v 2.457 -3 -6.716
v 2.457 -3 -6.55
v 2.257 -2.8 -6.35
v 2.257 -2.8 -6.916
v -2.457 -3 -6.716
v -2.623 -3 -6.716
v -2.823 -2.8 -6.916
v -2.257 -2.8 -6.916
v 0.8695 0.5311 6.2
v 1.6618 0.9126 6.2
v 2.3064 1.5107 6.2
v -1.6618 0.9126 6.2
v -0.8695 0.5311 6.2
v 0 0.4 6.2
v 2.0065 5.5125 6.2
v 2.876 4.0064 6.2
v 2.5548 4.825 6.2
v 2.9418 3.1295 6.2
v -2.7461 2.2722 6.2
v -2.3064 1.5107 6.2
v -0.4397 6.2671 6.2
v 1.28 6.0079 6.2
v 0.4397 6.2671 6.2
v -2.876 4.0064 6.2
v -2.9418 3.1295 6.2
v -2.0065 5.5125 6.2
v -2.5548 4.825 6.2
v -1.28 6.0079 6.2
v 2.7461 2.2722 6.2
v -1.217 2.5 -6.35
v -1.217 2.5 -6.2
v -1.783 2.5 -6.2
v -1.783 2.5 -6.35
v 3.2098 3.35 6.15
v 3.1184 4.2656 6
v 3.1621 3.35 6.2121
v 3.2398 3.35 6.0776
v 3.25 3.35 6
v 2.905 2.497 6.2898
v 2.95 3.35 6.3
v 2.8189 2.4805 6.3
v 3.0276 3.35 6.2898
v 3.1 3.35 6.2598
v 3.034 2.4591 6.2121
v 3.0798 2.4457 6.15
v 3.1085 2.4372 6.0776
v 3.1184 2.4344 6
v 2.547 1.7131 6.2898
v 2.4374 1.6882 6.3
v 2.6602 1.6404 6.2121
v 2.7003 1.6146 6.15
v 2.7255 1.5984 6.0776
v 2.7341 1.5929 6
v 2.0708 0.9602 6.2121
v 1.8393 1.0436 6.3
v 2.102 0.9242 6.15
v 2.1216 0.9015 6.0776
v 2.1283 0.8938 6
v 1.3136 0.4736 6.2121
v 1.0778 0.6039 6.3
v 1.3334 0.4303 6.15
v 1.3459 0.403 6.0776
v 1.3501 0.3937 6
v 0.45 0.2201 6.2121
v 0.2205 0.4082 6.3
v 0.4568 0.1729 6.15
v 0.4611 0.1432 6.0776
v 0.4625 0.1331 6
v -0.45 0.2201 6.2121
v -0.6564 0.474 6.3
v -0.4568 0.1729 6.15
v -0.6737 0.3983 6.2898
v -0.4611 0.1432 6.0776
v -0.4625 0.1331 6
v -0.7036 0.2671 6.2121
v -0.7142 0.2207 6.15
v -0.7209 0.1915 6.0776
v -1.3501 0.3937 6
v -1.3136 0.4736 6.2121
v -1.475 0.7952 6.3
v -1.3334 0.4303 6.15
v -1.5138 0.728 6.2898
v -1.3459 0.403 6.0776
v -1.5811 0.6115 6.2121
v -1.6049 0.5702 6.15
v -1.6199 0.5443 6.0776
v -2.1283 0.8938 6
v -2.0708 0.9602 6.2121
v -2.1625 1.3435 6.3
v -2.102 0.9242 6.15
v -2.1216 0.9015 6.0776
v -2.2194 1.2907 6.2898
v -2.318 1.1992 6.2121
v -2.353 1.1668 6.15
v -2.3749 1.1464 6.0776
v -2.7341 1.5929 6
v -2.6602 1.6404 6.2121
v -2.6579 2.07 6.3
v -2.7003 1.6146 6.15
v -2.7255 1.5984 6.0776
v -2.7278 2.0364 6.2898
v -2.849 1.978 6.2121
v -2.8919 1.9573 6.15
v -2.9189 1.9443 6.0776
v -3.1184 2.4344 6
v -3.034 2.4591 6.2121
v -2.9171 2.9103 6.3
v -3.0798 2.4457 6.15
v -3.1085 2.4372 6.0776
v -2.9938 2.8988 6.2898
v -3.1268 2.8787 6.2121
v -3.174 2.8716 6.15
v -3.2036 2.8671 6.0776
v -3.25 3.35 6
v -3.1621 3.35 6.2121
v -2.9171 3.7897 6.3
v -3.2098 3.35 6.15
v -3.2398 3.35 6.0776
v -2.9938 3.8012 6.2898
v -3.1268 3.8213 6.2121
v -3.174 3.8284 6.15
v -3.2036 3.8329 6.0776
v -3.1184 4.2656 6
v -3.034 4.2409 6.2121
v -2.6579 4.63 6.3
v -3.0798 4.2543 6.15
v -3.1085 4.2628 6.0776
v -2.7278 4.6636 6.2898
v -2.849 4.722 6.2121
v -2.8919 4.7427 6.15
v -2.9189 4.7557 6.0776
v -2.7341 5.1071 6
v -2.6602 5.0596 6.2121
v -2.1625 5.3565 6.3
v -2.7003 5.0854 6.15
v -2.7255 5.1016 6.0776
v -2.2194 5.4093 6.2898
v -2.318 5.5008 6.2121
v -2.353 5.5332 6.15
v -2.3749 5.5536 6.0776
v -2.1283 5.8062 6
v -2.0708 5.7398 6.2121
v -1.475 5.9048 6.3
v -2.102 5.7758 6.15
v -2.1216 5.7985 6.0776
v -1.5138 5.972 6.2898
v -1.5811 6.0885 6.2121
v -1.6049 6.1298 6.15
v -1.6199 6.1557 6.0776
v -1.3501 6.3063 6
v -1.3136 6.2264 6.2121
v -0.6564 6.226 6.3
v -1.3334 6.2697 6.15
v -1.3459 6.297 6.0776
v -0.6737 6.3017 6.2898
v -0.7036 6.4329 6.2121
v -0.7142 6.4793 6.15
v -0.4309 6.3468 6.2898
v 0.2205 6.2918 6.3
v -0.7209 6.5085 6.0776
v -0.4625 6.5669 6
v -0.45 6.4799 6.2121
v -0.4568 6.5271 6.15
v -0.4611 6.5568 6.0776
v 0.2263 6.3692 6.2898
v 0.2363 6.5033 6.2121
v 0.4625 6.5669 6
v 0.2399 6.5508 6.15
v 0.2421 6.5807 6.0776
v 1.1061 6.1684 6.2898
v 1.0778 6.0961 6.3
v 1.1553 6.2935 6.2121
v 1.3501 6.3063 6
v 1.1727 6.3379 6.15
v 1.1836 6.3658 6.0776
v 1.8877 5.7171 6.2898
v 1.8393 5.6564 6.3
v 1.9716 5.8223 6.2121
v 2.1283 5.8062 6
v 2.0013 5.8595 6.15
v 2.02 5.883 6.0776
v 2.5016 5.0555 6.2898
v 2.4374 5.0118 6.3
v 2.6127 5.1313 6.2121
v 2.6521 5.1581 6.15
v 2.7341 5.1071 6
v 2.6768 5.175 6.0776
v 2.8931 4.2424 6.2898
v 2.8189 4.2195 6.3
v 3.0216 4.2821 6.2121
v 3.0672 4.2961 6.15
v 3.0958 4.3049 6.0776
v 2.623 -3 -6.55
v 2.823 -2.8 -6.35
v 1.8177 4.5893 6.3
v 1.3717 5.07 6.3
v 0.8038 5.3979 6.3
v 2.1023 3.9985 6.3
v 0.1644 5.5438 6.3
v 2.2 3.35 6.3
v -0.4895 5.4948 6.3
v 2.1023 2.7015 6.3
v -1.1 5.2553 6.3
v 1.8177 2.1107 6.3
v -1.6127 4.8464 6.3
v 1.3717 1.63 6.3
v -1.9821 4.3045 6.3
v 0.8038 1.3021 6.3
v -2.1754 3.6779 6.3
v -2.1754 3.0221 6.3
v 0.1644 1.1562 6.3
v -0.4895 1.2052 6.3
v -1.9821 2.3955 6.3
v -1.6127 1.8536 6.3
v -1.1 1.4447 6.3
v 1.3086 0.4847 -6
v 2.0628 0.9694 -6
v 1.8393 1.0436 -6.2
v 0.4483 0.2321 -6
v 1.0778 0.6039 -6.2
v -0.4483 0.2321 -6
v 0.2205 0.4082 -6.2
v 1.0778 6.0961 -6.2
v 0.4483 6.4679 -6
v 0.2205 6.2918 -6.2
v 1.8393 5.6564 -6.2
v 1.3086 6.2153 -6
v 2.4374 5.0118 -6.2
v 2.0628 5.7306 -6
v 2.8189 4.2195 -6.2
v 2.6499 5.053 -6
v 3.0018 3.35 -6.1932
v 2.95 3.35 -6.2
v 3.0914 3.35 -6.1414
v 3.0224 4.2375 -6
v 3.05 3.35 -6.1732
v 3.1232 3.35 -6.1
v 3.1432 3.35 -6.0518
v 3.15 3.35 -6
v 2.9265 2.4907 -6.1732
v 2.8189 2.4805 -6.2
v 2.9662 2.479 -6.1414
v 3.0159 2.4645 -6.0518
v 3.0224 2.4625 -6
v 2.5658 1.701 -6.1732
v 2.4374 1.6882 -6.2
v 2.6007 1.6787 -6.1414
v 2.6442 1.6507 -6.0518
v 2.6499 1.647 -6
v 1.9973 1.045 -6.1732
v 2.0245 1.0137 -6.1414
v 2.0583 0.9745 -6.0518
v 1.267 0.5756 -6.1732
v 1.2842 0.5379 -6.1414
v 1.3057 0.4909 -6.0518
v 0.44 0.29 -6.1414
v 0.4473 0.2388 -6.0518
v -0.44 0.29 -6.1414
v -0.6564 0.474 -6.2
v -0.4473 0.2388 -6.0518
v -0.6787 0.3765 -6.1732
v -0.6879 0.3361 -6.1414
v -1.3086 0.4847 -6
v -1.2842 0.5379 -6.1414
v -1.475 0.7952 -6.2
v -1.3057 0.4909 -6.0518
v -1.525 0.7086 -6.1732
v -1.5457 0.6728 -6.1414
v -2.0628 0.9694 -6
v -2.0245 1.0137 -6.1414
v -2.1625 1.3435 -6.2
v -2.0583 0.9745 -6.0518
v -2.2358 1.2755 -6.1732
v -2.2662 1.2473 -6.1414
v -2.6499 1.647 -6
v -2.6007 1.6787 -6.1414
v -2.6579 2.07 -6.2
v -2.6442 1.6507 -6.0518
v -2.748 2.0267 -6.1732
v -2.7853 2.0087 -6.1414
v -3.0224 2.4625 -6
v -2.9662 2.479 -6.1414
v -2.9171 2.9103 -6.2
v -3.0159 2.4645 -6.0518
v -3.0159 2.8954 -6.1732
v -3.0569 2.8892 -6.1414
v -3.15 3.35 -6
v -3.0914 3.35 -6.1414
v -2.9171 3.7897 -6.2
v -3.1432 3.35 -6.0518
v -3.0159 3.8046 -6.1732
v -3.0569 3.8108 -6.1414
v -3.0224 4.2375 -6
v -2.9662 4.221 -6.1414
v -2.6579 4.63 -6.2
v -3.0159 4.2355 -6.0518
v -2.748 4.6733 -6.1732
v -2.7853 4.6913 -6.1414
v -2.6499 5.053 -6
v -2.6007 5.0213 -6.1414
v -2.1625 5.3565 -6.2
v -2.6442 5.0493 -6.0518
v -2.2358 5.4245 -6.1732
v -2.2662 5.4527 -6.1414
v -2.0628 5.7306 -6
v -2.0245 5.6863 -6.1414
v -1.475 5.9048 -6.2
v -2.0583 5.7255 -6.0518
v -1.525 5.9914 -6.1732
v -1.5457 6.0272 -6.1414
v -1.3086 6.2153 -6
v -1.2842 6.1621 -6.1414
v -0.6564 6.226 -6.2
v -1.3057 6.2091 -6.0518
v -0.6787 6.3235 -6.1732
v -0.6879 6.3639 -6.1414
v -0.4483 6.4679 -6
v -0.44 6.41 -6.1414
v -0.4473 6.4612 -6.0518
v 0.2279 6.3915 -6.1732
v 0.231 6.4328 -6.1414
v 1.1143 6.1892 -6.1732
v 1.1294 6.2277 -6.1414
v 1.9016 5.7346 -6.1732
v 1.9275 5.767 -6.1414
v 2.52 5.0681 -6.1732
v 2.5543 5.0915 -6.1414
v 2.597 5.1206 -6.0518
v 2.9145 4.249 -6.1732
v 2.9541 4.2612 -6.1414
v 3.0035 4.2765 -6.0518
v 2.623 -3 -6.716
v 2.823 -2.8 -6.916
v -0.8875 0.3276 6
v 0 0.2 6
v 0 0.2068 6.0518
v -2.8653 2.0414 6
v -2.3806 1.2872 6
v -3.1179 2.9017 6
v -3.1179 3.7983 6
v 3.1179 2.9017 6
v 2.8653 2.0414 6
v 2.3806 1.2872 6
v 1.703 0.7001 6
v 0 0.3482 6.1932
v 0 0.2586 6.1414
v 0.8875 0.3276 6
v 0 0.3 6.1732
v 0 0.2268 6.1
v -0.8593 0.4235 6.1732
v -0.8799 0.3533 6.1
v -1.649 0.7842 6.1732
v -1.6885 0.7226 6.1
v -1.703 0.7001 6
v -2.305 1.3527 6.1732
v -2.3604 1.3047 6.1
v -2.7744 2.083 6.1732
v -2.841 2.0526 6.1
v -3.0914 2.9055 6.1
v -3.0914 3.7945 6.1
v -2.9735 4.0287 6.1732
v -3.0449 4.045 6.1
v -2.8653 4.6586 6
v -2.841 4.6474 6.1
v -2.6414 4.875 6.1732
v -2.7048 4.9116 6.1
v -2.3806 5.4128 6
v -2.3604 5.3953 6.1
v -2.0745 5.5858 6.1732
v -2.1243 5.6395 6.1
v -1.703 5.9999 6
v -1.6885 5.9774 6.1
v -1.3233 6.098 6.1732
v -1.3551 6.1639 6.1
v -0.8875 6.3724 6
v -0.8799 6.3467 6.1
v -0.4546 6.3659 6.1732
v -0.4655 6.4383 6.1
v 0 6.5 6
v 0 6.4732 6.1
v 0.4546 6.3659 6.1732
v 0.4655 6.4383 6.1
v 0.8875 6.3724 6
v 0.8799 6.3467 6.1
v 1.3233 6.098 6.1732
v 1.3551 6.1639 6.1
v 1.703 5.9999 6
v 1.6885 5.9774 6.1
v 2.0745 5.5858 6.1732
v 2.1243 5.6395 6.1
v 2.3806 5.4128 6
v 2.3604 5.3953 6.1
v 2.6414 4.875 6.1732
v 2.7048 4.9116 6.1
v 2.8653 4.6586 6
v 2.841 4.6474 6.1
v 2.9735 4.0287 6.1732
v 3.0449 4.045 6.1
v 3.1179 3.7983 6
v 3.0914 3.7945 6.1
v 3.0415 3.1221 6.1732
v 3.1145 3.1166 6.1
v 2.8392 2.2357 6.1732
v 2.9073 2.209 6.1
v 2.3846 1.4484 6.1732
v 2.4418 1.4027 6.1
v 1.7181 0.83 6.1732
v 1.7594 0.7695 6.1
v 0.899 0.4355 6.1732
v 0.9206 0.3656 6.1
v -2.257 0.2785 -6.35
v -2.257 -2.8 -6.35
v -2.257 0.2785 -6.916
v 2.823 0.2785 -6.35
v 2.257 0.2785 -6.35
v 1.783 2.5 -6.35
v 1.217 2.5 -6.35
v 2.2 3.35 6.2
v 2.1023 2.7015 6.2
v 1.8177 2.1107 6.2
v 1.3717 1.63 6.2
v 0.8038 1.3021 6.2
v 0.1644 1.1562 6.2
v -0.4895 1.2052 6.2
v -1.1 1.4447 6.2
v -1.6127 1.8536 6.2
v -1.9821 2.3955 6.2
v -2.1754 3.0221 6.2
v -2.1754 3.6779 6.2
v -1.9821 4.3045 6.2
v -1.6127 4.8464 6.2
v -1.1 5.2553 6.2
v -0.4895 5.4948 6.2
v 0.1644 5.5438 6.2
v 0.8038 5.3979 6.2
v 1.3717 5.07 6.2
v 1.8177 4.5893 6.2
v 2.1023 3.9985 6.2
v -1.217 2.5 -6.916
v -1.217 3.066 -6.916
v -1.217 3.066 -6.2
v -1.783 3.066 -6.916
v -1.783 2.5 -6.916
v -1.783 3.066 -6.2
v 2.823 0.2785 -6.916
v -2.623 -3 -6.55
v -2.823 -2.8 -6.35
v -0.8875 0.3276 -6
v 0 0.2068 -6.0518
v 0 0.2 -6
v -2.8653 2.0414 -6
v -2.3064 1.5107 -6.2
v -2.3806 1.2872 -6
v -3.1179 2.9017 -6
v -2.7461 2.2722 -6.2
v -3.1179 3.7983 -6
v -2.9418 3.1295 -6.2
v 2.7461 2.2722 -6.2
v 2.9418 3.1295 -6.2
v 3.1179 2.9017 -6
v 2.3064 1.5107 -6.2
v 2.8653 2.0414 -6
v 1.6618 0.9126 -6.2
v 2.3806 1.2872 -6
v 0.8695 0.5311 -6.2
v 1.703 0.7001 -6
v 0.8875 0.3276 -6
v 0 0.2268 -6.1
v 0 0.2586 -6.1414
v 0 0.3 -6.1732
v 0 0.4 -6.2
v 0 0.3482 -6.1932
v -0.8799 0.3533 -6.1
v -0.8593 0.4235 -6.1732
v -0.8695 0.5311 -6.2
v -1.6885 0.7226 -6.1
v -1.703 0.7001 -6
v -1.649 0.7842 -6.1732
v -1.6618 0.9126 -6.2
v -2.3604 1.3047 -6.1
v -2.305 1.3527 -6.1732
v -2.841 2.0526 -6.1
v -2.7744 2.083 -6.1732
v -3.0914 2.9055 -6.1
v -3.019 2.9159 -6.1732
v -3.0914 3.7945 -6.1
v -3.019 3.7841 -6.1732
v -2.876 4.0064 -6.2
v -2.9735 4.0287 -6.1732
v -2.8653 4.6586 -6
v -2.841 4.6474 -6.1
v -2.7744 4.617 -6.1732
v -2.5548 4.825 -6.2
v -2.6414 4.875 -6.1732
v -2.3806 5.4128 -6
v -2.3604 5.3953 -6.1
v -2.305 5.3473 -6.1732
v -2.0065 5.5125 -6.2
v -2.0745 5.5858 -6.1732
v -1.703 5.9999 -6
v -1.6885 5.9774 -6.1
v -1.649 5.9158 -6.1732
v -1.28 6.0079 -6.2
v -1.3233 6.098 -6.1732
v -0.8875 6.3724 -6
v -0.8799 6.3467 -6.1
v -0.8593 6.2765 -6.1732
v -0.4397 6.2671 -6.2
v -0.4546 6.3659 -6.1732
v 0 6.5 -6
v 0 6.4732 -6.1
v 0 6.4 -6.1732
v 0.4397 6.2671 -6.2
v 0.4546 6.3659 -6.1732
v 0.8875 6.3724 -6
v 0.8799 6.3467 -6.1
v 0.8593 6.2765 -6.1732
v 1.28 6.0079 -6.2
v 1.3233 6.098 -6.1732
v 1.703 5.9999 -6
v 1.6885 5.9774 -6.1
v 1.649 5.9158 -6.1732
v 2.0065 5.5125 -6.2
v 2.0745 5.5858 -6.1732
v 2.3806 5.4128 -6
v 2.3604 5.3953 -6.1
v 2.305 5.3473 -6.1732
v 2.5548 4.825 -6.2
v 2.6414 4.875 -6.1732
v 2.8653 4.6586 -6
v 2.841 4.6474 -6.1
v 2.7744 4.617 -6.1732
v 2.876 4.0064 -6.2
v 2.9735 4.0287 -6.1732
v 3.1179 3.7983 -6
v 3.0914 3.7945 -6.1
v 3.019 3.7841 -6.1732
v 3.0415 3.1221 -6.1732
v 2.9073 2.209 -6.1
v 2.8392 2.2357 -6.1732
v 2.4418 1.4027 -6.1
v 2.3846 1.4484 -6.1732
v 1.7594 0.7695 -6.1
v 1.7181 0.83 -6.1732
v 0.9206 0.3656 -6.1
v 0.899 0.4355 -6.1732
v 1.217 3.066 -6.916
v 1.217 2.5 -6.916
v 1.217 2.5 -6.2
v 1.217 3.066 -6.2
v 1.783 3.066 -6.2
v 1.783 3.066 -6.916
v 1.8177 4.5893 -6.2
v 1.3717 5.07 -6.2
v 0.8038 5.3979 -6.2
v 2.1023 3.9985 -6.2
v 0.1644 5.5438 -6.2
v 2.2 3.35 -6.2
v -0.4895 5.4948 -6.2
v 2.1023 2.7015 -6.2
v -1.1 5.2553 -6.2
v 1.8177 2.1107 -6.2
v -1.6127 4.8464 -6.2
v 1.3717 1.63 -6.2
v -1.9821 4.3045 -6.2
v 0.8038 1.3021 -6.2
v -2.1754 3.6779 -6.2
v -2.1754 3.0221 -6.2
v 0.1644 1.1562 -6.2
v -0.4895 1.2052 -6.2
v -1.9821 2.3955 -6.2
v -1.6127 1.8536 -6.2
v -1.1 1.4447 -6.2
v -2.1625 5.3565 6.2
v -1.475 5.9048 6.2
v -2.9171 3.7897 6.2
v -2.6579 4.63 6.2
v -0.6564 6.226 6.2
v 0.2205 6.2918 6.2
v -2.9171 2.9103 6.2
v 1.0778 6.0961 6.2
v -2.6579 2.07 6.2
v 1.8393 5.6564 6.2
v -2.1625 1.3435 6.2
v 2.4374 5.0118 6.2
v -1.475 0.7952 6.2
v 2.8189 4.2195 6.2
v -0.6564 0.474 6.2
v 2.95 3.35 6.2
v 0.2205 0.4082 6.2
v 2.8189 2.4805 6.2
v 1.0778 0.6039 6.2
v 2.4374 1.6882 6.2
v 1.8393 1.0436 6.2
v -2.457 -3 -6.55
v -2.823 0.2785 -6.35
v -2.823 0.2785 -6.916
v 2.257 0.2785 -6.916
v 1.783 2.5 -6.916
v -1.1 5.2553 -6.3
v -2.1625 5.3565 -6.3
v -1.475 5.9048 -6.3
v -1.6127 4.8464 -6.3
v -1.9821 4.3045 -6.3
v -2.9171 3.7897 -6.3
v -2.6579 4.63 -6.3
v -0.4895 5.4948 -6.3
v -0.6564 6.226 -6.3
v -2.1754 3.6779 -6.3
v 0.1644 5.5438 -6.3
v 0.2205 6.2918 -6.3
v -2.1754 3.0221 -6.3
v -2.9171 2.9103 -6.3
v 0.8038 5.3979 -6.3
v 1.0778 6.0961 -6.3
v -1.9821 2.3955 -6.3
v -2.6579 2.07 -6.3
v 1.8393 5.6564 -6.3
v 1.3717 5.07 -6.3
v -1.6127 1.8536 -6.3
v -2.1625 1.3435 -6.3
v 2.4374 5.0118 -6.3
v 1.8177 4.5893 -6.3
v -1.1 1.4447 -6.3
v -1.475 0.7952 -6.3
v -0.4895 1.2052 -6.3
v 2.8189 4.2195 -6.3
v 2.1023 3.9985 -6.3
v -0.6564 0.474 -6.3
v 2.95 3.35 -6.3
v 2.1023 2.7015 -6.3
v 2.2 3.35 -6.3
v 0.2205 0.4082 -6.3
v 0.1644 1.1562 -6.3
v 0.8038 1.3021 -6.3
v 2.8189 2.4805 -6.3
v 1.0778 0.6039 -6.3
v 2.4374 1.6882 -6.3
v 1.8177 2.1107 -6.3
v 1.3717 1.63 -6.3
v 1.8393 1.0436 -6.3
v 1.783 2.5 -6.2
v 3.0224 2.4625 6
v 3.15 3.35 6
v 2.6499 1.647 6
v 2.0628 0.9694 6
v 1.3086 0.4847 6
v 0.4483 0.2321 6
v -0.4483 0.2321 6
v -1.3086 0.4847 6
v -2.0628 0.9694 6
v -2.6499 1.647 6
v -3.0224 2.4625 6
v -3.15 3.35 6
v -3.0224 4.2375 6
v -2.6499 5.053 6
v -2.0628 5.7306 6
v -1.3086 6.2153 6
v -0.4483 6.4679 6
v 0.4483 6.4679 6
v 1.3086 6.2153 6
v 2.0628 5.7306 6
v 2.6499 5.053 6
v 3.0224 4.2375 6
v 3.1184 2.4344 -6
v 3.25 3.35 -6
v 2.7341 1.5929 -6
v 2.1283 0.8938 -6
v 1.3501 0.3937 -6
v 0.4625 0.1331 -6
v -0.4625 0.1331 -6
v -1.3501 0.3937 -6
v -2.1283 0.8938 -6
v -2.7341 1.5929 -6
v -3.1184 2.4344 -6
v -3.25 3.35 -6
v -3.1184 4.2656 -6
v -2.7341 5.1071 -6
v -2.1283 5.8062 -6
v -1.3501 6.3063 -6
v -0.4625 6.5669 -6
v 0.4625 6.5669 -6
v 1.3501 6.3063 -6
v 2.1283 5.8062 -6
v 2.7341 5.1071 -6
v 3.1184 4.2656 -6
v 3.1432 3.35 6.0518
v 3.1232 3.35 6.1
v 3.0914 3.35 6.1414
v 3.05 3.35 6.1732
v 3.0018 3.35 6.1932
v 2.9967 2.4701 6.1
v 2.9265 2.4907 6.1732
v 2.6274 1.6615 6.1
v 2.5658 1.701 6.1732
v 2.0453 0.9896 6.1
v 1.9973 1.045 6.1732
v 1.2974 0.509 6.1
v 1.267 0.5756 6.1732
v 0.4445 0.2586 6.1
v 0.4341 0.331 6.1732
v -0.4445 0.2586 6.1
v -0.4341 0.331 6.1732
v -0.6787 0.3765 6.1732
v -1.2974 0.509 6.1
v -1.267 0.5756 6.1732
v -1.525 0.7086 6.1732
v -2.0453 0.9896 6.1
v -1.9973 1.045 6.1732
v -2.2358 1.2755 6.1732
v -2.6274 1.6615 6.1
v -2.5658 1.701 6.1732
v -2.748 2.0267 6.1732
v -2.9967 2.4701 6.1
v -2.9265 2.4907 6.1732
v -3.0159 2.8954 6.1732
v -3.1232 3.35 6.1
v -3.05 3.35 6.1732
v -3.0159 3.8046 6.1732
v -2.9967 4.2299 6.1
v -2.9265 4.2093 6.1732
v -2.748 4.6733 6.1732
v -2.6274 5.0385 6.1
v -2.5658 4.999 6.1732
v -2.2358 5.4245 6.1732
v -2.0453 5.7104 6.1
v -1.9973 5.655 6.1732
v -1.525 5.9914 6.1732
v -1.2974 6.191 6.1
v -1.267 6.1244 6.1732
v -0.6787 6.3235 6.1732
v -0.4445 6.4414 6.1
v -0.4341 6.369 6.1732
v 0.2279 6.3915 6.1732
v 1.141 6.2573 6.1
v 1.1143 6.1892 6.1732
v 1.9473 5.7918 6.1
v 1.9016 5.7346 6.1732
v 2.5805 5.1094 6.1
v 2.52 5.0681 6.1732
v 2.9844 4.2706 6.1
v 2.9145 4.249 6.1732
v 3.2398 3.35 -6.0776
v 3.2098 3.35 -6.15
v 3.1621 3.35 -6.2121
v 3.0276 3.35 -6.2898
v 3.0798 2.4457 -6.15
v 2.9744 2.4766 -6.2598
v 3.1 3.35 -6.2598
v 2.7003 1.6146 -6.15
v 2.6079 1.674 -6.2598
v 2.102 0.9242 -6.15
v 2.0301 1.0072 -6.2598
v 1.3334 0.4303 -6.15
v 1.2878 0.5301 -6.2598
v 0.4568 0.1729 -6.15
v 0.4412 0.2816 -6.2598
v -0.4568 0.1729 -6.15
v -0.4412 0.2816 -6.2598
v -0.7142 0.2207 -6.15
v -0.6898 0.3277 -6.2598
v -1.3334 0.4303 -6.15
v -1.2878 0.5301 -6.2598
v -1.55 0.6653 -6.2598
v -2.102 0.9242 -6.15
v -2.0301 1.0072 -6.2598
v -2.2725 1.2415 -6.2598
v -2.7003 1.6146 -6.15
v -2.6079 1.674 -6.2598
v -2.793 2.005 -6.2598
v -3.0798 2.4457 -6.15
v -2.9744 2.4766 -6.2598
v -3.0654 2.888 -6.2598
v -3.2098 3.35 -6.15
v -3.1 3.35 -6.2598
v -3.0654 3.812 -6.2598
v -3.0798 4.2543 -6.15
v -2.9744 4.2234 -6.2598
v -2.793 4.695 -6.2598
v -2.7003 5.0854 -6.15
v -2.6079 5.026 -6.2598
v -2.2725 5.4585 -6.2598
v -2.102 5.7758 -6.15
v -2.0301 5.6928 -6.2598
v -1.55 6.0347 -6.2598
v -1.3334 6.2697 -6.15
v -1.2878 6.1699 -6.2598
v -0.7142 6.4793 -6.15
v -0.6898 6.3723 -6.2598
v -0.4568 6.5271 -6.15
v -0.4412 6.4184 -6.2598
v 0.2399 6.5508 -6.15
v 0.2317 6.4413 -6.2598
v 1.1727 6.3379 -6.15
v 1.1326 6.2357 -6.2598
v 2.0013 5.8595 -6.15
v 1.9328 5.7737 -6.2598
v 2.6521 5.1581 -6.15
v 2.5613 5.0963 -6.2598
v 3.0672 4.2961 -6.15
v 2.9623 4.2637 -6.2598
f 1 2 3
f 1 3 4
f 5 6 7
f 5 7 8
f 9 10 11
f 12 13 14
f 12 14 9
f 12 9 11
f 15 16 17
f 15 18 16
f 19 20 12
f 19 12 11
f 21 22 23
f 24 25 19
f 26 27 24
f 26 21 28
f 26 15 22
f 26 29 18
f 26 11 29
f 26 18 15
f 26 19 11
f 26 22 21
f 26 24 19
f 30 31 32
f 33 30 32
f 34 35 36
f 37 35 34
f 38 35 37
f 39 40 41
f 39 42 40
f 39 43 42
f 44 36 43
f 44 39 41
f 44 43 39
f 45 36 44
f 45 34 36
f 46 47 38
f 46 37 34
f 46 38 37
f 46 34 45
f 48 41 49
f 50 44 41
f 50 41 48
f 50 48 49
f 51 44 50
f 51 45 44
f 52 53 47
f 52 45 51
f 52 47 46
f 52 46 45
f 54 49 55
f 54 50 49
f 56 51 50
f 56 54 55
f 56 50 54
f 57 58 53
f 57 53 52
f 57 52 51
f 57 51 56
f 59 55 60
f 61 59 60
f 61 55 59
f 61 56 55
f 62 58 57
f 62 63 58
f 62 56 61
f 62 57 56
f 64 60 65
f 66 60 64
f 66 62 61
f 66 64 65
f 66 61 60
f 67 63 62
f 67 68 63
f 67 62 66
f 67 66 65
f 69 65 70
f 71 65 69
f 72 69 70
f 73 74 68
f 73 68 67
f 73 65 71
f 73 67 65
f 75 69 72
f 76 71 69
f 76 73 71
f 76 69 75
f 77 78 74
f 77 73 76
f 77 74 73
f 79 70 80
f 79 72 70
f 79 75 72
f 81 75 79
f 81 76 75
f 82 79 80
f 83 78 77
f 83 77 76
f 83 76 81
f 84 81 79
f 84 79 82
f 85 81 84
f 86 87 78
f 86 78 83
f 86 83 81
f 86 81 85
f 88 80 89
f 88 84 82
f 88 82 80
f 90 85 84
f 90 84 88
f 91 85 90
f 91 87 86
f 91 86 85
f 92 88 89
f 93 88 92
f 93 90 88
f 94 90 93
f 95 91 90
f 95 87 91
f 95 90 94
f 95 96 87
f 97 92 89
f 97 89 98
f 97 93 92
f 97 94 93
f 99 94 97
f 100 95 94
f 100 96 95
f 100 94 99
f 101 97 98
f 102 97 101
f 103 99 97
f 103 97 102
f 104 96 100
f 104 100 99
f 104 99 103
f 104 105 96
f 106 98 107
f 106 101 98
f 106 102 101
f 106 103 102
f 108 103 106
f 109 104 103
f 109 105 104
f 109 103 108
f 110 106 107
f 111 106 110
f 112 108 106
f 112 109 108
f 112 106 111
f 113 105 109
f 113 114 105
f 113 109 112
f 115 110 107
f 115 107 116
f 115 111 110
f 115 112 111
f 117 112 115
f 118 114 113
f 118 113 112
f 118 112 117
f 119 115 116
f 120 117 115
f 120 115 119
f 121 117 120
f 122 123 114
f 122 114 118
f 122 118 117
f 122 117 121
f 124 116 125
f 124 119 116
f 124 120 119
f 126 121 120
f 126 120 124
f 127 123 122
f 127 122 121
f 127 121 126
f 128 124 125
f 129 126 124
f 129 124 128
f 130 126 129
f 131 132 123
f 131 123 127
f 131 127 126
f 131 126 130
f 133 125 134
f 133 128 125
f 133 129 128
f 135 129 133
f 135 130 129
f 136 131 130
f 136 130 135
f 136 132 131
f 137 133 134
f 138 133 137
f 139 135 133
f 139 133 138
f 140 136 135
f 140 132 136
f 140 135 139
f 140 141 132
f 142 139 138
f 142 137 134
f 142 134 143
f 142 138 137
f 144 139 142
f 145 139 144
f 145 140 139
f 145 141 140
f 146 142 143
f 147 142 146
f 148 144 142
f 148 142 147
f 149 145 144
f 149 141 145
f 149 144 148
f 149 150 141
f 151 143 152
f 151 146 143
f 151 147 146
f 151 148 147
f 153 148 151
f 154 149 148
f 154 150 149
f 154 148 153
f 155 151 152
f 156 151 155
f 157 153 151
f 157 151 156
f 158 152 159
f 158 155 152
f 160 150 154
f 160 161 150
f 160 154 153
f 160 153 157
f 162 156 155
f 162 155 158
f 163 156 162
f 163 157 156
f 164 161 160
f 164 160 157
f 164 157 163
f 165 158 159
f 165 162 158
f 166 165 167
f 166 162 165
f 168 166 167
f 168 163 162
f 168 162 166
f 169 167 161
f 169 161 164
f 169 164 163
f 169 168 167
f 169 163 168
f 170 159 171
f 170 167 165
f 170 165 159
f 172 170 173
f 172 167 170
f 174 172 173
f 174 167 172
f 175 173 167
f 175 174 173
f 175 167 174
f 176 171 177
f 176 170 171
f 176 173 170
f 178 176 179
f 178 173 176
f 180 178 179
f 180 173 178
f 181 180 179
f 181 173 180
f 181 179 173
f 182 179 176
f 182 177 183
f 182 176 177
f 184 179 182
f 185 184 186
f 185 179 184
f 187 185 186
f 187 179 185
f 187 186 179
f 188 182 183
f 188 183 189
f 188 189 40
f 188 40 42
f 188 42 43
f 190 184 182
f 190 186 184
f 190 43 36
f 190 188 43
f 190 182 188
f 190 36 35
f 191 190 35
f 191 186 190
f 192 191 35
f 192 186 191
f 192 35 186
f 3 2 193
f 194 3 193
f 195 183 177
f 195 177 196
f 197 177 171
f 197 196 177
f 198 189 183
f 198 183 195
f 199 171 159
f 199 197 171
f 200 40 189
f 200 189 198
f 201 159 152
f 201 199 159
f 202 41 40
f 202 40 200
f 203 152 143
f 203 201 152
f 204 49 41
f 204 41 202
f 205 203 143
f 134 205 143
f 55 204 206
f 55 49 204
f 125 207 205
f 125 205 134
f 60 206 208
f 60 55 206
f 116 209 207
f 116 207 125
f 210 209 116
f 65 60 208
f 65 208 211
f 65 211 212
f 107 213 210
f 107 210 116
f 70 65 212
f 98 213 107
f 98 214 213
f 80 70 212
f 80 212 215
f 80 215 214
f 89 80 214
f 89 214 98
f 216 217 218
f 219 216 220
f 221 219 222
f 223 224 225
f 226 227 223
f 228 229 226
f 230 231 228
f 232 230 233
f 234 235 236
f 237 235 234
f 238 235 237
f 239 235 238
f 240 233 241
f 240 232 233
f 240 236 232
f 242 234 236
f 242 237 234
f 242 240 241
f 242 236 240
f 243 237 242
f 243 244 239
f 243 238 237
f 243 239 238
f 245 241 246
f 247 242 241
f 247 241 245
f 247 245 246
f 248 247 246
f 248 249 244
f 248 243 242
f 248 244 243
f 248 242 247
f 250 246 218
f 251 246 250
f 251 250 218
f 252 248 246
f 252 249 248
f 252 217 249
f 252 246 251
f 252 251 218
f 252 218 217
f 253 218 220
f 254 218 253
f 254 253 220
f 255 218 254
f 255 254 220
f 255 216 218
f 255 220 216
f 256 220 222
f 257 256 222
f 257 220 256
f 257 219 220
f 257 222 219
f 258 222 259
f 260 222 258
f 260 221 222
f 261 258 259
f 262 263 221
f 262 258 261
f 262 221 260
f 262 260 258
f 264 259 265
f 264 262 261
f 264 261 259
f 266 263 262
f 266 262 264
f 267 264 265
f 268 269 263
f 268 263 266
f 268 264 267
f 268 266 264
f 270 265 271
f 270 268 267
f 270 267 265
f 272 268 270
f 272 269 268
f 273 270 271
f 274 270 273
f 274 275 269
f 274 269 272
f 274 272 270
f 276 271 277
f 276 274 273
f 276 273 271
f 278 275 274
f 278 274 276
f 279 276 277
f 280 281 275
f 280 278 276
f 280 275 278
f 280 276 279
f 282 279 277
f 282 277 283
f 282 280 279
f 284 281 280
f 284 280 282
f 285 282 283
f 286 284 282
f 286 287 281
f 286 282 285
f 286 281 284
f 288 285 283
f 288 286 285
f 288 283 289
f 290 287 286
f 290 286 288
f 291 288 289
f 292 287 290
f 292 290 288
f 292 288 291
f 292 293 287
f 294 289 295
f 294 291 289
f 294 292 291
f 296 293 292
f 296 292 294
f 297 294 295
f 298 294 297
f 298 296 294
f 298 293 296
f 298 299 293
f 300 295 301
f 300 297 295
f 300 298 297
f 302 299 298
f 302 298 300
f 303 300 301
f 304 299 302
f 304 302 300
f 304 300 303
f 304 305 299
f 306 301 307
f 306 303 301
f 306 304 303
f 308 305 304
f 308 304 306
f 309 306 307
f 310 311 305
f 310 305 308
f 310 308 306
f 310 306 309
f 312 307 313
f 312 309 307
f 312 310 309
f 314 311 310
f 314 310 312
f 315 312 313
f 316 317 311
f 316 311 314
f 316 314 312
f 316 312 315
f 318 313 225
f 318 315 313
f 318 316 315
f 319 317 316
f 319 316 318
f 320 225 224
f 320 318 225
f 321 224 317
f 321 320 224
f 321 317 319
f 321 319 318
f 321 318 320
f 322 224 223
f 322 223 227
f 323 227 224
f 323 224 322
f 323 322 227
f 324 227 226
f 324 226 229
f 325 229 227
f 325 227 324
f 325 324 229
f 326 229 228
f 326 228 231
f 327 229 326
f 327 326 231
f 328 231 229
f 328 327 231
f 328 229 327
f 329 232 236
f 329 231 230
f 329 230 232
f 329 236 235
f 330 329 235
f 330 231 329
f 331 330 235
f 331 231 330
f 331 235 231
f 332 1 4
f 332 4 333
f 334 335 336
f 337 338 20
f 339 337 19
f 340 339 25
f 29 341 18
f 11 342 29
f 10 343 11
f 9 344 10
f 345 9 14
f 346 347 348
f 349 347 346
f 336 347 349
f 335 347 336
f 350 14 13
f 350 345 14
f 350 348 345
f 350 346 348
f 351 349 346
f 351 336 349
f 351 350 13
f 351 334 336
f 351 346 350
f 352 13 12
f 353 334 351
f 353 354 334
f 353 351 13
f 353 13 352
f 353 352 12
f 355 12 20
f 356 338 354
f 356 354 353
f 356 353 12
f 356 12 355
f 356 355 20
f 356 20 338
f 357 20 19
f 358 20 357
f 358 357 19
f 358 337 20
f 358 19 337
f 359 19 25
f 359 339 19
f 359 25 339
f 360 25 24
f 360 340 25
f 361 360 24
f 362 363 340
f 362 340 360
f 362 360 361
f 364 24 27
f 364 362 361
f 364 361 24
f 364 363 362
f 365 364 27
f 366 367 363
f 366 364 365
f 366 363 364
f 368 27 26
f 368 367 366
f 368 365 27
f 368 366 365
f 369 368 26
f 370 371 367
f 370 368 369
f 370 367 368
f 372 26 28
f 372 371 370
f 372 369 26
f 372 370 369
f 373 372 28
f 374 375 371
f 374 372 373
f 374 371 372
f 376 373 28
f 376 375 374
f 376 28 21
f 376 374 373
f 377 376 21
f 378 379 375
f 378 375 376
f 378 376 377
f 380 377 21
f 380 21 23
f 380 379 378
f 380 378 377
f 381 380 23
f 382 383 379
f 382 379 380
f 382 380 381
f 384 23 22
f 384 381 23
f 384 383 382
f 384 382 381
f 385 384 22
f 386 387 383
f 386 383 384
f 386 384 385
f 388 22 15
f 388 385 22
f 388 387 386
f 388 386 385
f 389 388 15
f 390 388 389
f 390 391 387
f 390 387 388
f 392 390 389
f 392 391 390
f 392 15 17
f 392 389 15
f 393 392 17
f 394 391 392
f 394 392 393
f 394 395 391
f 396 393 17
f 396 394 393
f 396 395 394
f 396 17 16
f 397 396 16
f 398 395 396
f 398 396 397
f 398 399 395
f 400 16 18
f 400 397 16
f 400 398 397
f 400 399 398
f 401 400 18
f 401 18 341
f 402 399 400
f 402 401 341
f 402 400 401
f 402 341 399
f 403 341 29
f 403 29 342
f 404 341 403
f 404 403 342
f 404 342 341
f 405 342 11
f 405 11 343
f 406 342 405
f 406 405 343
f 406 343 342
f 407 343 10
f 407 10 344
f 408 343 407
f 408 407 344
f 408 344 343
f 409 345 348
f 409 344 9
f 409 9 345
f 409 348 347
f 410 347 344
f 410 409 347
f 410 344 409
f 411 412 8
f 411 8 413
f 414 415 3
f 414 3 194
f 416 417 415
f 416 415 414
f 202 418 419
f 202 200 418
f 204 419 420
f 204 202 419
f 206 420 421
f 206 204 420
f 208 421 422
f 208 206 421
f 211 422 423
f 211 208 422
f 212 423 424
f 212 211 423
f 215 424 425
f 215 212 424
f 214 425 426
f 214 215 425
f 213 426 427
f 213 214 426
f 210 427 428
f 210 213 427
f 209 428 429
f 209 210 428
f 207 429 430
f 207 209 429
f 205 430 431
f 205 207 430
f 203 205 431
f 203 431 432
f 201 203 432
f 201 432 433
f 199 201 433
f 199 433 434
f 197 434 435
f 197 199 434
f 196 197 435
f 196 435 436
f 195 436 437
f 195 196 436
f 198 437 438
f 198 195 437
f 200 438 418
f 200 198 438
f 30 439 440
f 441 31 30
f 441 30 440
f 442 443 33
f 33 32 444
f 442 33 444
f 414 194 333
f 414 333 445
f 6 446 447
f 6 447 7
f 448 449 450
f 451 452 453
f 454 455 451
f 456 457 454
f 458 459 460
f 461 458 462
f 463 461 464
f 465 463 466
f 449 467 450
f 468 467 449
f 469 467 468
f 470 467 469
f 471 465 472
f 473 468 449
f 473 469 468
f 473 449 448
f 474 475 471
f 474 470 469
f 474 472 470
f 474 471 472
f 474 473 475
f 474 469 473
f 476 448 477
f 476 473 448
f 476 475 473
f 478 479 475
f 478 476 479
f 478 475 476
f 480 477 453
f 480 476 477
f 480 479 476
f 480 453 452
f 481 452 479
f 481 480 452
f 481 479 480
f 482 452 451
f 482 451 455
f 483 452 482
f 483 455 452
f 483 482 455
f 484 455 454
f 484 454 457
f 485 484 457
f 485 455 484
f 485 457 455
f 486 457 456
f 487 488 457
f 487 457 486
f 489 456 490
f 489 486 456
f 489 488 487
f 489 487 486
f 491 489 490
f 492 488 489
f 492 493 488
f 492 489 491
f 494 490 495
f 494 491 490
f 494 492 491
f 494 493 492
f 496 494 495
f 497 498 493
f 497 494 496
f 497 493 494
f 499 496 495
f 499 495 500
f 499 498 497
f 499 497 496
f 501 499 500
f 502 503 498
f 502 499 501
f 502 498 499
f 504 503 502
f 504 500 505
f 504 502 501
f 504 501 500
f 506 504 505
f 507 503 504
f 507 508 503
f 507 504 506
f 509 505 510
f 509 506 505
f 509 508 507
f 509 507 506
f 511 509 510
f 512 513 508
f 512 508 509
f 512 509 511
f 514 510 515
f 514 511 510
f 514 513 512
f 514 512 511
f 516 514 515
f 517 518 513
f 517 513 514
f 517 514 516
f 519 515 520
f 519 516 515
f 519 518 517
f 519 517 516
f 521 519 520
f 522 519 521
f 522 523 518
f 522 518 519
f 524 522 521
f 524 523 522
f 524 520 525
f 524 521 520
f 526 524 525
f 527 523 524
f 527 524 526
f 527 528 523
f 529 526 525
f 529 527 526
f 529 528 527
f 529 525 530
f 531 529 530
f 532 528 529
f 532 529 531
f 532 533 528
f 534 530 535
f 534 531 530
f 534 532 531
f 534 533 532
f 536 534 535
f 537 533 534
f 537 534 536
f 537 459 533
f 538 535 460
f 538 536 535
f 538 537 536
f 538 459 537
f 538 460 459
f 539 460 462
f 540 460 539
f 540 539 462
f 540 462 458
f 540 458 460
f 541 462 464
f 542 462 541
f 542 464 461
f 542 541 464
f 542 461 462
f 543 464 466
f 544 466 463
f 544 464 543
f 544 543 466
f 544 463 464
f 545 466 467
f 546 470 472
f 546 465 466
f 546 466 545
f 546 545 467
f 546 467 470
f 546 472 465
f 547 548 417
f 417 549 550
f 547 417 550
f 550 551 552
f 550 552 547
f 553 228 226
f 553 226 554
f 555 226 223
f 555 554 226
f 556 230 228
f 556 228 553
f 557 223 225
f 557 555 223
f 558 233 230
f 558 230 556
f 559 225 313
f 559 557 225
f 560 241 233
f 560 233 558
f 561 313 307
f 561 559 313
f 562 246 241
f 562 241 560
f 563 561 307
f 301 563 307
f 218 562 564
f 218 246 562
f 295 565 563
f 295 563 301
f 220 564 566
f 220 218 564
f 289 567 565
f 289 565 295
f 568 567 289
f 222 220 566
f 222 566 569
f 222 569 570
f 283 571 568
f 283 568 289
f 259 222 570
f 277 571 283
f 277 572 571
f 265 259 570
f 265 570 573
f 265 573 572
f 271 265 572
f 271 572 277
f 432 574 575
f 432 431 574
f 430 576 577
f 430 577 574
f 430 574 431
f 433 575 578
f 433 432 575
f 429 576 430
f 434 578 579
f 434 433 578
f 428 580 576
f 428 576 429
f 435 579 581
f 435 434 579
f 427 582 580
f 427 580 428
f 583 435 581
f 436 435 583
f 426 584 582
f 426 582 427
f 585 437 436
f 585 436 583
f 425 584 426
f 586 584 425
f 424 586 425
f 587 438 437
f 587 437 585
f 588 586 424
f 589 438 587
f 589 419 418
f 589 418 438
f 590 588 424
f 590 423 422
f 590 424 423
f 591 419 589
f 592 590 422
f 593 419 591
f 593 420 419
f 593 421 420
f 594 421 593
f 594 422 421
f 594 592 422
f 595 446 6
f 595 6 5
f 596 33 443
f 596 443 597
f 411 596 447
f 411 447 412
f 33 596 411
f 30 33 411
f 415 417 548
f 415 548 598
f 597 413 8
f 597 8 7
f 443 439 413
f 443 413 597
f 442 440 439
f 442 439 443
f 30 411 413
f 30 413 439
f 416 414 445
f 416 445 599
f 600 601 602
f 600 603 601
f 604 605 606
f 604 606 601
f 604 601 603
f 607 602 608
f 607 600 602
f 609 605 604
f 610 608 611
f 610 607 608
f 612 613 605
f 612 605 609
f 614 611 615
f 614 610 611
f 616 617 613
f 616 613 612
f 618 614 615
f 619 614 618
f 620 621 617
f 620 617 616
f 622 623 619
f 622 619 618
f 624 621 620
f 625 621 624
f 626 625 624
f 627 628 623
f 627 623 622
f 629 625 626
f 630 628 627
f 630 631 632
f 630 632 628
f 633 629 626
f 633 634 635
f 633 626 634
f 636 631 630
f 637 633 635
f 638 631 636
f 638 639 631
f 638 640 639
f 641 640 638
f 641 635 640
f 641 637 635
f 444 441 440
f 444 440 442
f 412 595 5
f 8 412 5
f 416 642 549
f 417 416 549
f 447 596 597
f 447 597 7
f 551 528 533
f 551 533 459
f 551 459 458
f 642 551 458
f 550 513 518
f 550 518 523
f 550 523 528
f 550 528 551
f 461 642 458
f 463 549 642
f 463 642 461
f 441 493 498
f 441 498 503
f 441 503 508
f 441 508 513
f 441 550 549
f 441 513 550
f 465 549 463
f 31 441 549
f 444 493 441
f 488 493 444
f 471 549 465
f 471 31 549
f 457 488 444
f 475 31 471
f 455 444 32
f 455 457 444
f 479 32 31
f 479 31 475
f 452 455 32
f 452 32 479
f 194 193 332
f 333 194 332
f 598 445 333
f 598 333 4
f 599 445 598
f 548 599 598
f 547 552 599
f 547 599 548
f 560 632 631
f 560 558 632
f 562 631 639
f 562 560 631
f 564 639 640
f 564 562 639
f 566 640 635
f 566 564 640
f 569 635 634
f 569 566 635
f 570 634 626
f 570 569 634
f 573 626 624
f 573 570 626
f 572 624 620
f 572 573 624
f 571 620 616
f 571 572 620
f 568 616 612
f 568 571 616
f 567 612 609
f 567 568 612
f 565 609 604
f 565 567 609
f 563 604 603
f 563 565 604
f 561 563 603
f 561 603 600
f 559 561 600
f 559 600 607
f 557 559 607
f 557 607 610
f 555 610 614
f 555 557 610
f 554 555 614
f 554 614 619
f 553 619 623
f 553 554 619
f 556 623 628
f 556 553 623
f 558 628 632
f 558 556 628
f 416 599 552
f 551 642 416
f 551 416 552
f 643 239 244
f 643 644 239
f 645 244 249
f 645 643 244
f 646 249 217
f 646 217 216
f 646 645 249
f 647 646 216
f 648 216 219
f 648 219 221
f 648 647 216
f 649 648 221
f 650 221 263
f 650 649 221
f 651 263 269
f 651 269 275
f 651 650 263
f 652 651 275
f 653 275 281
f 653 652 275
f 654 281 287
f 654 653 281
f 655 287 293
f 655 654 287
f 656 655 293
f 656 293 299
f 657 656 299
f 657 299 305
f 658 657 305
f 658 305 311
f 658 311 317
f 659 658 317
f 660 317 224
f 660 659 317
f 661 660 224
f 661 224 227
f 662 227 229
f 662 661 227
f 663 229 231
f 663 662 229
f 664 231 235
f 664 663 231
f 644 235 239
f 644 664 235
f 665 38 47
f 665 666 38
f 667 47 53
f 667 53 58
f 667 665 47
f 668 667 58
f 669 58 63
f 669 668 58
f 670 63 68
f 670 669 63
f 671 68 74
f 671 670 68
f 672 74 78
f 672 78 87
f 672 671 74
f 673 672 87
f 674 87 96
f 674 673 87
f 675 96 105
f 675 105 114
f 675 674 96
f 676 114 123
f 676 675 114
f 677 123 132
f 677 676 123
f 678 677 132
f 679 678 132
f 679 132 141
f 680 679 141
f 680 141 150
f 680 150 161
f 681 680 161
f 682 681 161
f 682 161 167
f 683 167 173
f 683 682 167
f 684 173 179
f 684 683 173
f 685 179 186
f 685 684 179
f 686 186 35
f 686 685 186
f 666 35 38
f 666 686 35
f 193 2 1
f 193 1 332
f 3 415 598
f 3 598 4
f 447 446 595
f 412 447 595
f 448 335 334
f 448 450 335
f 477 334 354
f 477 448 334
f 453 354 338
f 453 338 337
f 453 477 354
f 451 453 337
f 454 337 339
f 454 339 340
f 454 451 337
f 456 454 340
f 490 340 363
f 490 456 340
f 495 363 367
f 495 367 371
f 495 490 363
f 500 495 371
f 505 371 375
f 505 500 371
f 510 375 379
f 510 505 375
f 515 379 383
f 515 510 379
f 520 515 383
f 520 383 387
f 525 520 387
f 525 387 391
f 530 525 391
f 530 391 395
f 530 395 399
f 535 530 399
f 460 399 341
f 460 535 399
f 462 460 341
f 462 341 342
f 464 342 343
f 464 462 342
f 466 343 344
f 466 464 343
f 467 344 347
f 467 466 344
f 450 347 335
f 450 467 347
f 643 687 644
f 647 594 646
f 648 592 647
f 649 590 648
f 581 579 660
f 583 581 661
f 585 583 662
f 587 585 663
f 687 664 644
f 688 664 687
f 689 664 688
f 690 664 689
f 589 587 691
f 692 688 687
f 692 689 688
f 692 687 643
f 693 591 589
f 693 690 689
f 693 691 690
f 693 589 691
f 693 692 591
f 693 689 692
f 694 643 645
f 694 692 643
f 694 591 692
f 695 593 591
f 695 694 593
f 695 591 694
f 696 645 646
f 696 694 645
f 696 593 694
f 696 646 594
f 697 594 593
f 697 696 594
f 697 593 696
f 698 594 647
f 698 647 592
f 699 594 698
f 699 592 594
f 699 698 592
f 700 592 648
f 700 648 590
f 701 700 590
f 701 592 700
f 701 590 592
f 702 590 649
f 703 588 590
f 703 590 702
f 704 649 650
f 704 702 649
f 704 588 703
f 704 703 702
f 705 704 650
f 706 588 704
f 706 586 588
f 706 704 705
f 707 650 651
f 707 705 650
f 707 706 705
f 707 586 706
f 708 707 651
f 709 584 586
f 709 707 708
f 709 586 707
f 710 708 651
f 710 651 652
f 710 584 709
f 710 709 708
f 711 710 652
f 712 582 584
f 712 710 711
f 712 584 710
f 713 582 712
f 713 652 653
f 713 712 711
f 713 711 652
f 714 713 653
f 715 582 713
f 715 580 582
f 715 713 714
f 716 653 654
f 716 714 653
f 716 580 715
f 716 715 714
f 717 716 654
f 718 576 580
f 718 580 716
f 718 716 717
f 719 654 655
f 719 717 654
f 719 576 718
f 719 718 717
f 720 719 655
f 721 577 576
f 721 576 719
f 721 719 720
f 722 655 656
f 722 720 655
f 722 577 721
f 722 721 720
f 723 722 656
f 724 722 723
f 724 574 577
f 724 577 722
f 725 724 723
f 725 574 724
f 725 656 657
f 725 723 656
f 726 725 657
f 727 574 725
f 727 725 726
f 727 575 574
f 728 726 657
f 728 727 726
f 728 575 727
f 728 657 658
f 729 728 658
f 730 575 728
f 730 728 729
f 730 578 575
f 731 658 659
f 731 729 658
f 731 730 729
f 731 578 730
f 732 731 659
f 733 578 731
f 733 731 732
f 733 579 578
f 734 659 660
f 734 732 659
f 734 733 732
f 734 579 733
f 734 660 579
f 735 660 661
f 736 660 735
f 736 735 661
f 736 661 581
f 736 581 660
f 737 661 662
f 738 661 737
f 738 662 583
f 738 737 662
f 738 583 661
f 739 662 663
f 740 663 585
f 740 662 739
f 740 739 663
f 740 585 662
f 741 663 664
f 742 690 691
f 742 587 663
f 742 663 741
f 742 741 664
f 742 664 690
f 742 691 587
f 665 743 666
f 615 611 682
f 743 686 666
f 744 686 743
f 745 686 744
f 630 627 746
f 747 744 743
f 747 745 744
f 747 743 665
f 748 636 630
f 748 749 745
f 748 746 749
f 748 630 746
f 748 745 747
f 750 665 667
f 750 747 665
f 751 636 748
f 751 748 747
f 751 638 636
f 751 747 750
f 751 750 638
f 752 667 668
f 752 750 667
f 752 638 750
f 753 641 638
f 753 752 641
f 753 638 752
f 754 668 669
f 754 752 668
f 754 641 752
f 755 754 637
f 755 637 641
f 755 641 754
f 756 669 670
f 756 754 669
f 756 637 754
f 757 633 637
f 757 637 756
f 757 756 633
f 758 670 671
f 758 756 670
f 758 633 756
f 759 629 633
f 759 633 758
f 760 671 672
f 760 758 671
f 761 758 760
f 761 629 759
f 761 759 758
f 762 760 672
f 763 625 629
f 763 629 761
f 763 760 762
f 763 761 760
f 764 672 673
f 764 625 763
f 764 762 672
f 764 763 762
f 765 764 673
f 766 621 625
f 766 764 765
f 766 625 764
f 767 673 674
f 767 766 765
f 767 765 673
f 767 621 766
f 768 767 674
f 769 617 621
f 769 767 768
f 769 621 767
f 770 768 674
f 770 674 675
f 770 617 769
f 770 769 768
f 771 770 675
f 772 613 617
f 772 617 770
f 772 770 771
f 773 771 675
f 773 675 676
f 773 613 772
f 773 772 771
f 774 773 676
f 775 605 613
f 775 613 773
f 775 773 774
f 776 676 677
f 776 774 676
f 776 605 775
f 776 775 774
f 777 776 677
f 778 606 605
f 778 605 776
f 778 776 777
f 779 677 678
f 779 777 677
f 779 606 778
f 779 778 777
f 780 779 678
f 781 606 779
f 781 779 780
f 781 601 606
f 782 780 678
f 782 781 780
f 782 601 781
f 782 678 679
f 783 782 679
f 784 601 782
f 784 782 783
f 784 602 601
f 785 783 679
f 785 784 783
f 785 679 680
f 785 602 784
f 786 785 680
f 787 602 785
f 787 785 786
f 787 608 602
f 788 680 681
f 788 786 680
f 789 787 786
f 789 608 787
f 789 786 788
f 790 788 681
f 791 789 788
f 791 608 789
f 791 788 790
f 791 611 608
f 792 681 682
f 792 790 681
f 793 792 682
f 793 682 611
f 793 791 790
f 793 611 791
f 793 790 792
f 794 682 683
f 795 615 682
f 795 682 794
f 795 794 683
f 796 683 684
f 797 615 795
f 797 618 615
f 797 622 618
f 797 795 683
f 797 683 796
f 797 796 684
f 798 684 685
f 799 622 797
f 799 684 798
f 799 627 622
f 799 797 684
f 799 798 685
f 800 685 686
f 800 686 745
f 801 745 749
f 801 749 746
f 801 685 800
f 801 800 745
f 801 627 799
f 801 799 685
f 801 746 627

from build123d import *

# Parameters (mm, degrees)
BOSS_EXTRUDE1_DEPTH   = 0.566
BOSS_EXTRUDE1_2_DEPTH = 0.566
SKETCH4_W             = 0.566
SKETCH4_H             = 0.566
BOSS_EXTRUDE2_DEPTH   = 0.716
CHAMFER1_SIZE         = 0.2


with BuildPart() as part:
    # Sketch1 → Revolve1 (revolve)
    with BuildSketch(Plane(origin=(0, 0, 0), x_dir=(0, 0, -1), z_dir=(1, 0, 0)), mode=Mode.PRIVATE) as revolve1_sk:
        with BuildLine():
            ThreePointArc((-6.3, 0.4), (-6.212132034, 0.187867966), (-6, 0.1))
            Line((-6, 0.1), (6, 0.1))
            ThreePointArc((6, 0.1), (6.212132034, 0.187867966), (6.3, 0.4))
            Line((6.3, 0.4), (6.3, 1.15))
            Line((6.3, 1.15), (6.2, 1.15))
            Line((6.2, 1.15), (6.2, 0.4))
            ThreePointArc((6.2, 0.4), (6.141421356, 0.258578644), (6, 0.2))
            Line((6, 0.2), (-6, 0.2))
            ThreePointArc((-6, 0.2), (-6.141421356, 0.258578644), (-6.2, 0.4))
            Line((-6.2, 0.4), (-6.2, 1.15))
            Line((-6.2, 1.15), (-6.3, 1.15))
            Line((-6.3, 1.15), (-6.3, 0.4))
        make_face()
    revolve(revolve1_sk.sketch.rotate(Axis((0, 3.35, 8.510583283), (0, 0, -1)), 270), axis=Axis((0, 3.35, 8.510583283), (0, 0, -1)))


with BuildPart() as body_2:
    # Sketch1<4> → Revolve2 (revolve)
    with BuildSketch(Plane(origin=(0, 0, 0), x_dir=(0, 0, -1), z_dir=(1, 0, 0))):
        with BuildLine():
            Line((-6.2, 3.35), (-6.2, 1.15))
            Line((-6.2, 1.15), (-6.2, 0.4))
            ThreePointArc((-6.2, 0.4), (-6.141421356, 0.258578644), (-6, 0.2))
            Line((-6, 0.2), (6, 0.2))
            ThreePointArc((6, 0.2), (6.141421356, 0.258578644), (6.2, 0.4))
            Line((6.2, 0.4), (6.2, 1.15))
            Line((6.2, 1.15), (6.2, 3.35))
            Line((6.2, 3.35), (-6.2, 3.35))
        make_face()
    revolve(axis=Axis((0, 3.35, 8.510583283), (0, 0, -1)))



with BuildPart() as body_3:
    # Sketch3 → Boss-Extrude1 (new body)
    with BuildSketch(Plane(origin=(0, 0, -6.35), x_dir=(-1, 0, 0), z_dir=(0, 0, -1))):
        Polygon((2.257, -3), (2.257, 0.278543307), (1.217, 2.5), (1.783, 2.5), (2.823, 0.278543307), (2.823, -3), align=None)
    extrude(amount=BOSS_EXTRUDE1_DEPTH)


with BuildPart() as body_4:
    # Sketch3 → Boss-Extrude1 2 (new body)
    with BuildSketch(Plane(origin=(0, 0, -6.35), x_dir=(-1, 0, 0), z_dir=(0, 0, -1))):
        Polygon((-2.823, 0.278543307), (-1.783, 2.5), (-1.217, 2.5), (-2.257, 0.278543307), (-2.257, -3), (-2.823, -3), align=None)
    extrude(amount=BOSS_EXTRUDE1_2_DEPTH)


with BuildPart() as body_2_1:
    add(body_2.part)

    add(body_3.part)  # Boss-Extrude2 merges body 3

    add(body_4.part)  # Boss-Extrude2 merges body 4
    # Sketch4 → Boss-Extrude2 (add)
    with BuildSketch(Plane(origin=(0, 0, -6.2), x_dir=(-1, 0, 0), z_dir=(0, 0, -1))):
        with Locations((-1.5, 2.783)):
            Rectangle(SKETCH4_W, SKETCH4_H)
        with Locations((1.5, 2.783)):
            Rectangle(SKETCH4_W, SKETCH4_H)
    extrude(amount=BOSS_EXTRUDE2_DEPTH)

    # Chamfer1
    chamfer1_edges = [body_2_1.edges().sort_by_distance(p)[0] for p in [
        (2.54, -3, -6.35),
        (2.823, -3, -6.633),
        (2.257, -3, -6.633),
        (2.54, -3, -6.916),
        (-2.54, -3, -6.35),
        (-2.257, -3, -6.633),
        (-2.823, -3, -6.633),
        (-2.54, -3, -6.916),
    ]]
    chamfer(chamfer1_edges, length=CHAMFER1_SIZE)


solid = Compound([part.part, body_2_1.part])
